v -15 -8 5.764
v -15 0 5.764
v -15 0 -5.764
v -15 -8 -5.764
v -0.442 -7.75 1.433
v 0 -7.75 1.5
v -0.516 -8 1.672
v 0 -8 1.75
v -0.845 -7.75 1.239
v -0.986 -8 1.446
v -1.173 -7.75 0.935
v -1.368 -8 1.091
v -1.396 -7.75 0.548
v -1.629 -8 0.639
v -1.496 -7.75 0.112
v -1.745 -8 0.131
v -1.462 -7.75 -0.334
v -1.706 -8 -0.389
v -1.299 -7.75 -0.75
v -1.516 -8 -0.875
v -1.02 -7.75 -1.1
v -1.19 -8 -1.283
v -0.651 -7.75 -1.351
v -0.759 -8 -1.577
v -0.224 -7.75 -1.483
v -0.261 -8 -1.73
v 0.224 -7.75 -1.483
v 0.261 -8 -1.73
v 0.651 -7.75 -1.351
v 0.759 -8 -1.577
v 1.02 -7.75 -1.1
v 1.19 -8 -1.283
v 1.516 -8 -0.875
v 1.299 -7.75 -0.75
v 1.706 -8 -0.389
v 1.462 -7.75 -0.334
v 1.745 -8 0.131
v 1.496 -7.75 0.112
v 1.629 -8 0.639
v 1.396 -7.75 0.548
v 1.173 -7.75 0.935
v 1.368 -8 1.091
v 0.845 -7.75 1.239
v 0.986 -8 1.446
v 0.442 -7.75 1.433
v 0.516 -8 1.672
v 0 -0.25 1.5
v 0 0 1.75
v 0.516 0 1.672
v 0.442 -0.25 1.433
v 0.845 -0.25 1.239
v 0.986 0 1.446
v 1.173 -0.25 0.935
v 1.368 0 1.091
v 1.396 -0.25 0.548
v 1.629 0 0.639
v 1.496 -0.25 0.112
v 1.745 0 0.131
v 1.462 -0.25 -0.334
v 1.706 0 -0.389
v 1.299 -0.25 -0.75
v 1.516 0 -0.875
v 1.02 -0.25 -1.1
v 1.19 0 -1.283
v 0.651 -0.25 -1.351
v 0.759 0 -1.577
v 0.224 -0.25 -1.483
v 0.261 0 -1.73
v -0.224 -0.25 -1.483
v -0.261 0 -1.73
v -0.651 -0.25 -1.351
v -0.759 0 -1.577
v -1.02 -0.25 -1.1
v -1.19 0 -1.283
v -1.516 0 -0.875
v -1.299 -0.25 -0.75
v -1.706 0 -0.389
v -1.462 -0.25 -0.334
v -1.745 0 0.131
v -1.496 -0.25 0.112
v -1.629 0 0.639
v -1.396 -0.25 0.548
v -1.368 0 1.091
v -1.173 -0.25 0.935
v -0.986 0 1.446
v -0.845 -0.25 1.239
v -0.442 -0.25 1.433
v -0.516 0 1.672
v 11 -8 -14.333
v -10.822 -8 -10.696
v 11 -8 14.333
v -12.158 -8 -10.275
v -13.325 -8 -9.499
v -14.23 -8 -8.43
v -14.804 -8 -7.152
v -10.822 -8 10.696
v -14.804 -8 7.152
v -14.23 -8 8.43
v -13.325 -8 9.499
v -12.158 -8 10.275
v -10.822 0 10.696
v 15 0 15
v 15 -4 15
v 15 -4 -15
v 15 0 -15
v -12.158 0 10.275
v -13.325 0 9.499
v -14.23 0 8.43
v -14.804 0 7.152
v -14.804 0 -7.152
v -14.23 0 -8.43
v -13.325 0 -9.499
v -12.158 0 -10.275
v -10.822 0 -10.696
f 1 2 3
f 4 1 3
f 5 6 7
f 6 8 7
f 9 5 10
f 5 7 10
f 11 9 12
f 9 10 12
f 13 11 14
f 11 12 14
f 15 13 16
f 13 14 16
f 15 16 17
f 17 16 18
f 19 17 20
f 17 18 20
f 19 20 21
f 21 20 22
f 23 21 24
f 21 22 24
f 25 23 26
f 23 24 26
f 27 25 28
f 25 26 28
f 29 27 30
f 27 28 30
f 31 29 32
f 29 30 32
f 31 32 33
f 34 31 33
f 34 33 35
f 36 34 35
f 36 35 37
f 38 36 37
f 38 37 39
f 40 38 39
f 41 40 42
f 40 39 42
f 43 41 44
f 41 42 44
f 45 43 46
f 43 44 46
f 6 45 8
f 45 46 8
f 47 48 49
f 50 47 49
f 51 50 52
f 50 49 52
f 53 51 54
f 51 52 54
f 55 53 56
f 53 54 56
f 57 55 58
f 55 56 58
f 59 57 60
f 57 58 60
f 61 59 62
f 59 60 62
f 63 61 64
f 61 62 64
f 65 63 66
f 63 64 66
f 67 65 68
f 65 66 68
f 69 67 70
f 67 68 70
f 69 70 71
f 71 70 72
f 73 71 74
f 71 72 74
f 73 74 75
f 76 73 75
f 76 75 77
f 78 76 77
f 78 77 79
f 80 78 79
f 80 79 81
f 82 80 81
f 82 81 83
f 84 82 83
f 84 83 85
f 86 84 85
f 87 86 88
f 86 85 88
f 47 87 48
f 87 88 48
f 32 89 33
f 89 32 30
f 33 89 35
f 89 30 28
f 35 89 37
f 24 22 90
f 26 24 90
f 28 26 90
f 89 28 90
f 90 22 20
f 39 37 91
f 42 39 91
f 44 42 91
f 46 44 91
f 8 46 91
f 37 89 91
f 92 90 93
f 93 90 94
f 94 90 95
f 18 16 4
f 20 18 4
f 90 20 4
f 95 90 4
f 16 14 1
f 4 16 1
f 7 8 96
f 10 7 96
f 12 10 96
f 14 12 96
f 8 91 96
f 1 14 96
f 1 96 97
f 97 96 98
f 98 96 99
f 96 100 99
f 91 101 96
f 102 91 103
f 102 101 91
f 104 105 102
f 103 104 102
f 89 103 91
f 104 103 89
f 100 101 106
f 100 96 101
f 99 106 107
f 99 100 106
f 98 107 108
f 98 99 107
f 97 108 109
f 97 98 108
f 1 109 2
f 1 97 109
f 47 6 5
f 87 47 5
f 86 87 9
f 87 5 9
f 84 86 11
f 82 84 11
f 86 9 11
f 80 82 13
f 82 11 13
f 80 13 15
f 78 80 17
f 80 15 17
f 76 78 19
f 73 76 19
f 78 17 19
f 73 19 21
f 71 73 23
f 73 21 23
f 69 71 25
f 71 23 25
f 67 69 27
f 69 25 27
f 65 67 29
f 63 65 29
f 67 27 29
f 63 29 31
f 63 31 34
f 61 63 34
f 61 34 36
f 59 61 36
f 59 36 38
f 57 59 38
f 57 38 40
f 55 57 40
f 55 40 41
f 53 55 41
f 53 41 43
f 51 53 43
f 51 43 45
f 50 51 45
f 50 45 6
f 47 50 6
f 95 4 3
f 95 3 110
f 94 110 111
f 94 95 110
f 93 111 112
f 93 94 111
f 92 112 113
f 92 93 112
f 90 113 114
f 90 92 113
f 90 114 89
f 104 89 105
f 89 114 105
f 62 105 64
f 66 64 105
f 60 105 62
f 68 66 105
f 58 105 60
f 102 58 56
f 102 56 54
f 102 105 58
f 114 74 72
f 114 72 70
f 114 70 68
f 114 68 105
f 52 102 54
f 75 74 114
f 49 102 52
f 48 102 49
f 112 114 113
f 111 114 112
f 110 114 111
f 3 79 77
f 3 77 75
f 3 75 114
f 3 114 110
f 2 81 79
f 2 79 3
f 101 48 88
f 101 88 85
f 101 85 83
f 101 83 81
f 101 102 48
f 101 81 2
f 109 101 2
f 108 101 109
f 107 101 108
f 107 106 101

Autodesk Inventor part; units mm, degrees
ref_plane "YZ Plane" through (0, 0, 0) normal (1, 0, 0) x (0, 1, 0)
ref_plane "XZ Plane" through (0, 0, 0) normal (0, 1, 0) x (-1, 0, 0)
ref_plane "XY Plane" through (0, 0, 0) normal (0, 0, 1) x (1, 0, 0)
sketch "Sketch1" plane through (0, 0, 0) normal (0, 1, 0) x (-1, 0, 0)
  line L0 (-15, 15) -> (15, 15)
  line L1 (15, 15) -> (15, -15)
  line L2 (15, -15) -> (-15, -15)
  line L3 (-15, -15) -> (-15, 15)
  line L4 (-15, 15) -> (15, -15) construction
  line L5 (15, 15) -> (-15, -15) construction
  line L6 (15, -10) -> (-15, -15)
  line L7 (21, 0) -> (-21, 0) construction
  line L8 (15, 10) -> (-15, 15)
  point P0 (0, 0)
  point P1 (0, 0)
  point P2 (-15, 15)
  point P3 (15, 10)
  dimension "d1" = 30
  dimension "d2" = 30
  dimension "d19" = 20
  dimension "d20" = 30
extrude "Extrusion1" add sketch "Sketch1" against normal blind 8 contours L8 L1 L6 L3
hole "Hole1" at (0, 0, 0) direction (0, -1, 0) diameter 3 end through all countersink diameter 3.5 countersink angle 90
chamfer "Chamfer1" distance 0.25 angle 45 1 edges at (0, -8, -1.5)
fillet "Fillet1" radius 5 2 edges at (-15, -4, 10) (-15, -4, -10)
chamfer "Chamfer3" distance 4 angle 45 1 edges at (15, -8, 0)
properties part number "TCSM1-002A" material "Wood (Oak)"
